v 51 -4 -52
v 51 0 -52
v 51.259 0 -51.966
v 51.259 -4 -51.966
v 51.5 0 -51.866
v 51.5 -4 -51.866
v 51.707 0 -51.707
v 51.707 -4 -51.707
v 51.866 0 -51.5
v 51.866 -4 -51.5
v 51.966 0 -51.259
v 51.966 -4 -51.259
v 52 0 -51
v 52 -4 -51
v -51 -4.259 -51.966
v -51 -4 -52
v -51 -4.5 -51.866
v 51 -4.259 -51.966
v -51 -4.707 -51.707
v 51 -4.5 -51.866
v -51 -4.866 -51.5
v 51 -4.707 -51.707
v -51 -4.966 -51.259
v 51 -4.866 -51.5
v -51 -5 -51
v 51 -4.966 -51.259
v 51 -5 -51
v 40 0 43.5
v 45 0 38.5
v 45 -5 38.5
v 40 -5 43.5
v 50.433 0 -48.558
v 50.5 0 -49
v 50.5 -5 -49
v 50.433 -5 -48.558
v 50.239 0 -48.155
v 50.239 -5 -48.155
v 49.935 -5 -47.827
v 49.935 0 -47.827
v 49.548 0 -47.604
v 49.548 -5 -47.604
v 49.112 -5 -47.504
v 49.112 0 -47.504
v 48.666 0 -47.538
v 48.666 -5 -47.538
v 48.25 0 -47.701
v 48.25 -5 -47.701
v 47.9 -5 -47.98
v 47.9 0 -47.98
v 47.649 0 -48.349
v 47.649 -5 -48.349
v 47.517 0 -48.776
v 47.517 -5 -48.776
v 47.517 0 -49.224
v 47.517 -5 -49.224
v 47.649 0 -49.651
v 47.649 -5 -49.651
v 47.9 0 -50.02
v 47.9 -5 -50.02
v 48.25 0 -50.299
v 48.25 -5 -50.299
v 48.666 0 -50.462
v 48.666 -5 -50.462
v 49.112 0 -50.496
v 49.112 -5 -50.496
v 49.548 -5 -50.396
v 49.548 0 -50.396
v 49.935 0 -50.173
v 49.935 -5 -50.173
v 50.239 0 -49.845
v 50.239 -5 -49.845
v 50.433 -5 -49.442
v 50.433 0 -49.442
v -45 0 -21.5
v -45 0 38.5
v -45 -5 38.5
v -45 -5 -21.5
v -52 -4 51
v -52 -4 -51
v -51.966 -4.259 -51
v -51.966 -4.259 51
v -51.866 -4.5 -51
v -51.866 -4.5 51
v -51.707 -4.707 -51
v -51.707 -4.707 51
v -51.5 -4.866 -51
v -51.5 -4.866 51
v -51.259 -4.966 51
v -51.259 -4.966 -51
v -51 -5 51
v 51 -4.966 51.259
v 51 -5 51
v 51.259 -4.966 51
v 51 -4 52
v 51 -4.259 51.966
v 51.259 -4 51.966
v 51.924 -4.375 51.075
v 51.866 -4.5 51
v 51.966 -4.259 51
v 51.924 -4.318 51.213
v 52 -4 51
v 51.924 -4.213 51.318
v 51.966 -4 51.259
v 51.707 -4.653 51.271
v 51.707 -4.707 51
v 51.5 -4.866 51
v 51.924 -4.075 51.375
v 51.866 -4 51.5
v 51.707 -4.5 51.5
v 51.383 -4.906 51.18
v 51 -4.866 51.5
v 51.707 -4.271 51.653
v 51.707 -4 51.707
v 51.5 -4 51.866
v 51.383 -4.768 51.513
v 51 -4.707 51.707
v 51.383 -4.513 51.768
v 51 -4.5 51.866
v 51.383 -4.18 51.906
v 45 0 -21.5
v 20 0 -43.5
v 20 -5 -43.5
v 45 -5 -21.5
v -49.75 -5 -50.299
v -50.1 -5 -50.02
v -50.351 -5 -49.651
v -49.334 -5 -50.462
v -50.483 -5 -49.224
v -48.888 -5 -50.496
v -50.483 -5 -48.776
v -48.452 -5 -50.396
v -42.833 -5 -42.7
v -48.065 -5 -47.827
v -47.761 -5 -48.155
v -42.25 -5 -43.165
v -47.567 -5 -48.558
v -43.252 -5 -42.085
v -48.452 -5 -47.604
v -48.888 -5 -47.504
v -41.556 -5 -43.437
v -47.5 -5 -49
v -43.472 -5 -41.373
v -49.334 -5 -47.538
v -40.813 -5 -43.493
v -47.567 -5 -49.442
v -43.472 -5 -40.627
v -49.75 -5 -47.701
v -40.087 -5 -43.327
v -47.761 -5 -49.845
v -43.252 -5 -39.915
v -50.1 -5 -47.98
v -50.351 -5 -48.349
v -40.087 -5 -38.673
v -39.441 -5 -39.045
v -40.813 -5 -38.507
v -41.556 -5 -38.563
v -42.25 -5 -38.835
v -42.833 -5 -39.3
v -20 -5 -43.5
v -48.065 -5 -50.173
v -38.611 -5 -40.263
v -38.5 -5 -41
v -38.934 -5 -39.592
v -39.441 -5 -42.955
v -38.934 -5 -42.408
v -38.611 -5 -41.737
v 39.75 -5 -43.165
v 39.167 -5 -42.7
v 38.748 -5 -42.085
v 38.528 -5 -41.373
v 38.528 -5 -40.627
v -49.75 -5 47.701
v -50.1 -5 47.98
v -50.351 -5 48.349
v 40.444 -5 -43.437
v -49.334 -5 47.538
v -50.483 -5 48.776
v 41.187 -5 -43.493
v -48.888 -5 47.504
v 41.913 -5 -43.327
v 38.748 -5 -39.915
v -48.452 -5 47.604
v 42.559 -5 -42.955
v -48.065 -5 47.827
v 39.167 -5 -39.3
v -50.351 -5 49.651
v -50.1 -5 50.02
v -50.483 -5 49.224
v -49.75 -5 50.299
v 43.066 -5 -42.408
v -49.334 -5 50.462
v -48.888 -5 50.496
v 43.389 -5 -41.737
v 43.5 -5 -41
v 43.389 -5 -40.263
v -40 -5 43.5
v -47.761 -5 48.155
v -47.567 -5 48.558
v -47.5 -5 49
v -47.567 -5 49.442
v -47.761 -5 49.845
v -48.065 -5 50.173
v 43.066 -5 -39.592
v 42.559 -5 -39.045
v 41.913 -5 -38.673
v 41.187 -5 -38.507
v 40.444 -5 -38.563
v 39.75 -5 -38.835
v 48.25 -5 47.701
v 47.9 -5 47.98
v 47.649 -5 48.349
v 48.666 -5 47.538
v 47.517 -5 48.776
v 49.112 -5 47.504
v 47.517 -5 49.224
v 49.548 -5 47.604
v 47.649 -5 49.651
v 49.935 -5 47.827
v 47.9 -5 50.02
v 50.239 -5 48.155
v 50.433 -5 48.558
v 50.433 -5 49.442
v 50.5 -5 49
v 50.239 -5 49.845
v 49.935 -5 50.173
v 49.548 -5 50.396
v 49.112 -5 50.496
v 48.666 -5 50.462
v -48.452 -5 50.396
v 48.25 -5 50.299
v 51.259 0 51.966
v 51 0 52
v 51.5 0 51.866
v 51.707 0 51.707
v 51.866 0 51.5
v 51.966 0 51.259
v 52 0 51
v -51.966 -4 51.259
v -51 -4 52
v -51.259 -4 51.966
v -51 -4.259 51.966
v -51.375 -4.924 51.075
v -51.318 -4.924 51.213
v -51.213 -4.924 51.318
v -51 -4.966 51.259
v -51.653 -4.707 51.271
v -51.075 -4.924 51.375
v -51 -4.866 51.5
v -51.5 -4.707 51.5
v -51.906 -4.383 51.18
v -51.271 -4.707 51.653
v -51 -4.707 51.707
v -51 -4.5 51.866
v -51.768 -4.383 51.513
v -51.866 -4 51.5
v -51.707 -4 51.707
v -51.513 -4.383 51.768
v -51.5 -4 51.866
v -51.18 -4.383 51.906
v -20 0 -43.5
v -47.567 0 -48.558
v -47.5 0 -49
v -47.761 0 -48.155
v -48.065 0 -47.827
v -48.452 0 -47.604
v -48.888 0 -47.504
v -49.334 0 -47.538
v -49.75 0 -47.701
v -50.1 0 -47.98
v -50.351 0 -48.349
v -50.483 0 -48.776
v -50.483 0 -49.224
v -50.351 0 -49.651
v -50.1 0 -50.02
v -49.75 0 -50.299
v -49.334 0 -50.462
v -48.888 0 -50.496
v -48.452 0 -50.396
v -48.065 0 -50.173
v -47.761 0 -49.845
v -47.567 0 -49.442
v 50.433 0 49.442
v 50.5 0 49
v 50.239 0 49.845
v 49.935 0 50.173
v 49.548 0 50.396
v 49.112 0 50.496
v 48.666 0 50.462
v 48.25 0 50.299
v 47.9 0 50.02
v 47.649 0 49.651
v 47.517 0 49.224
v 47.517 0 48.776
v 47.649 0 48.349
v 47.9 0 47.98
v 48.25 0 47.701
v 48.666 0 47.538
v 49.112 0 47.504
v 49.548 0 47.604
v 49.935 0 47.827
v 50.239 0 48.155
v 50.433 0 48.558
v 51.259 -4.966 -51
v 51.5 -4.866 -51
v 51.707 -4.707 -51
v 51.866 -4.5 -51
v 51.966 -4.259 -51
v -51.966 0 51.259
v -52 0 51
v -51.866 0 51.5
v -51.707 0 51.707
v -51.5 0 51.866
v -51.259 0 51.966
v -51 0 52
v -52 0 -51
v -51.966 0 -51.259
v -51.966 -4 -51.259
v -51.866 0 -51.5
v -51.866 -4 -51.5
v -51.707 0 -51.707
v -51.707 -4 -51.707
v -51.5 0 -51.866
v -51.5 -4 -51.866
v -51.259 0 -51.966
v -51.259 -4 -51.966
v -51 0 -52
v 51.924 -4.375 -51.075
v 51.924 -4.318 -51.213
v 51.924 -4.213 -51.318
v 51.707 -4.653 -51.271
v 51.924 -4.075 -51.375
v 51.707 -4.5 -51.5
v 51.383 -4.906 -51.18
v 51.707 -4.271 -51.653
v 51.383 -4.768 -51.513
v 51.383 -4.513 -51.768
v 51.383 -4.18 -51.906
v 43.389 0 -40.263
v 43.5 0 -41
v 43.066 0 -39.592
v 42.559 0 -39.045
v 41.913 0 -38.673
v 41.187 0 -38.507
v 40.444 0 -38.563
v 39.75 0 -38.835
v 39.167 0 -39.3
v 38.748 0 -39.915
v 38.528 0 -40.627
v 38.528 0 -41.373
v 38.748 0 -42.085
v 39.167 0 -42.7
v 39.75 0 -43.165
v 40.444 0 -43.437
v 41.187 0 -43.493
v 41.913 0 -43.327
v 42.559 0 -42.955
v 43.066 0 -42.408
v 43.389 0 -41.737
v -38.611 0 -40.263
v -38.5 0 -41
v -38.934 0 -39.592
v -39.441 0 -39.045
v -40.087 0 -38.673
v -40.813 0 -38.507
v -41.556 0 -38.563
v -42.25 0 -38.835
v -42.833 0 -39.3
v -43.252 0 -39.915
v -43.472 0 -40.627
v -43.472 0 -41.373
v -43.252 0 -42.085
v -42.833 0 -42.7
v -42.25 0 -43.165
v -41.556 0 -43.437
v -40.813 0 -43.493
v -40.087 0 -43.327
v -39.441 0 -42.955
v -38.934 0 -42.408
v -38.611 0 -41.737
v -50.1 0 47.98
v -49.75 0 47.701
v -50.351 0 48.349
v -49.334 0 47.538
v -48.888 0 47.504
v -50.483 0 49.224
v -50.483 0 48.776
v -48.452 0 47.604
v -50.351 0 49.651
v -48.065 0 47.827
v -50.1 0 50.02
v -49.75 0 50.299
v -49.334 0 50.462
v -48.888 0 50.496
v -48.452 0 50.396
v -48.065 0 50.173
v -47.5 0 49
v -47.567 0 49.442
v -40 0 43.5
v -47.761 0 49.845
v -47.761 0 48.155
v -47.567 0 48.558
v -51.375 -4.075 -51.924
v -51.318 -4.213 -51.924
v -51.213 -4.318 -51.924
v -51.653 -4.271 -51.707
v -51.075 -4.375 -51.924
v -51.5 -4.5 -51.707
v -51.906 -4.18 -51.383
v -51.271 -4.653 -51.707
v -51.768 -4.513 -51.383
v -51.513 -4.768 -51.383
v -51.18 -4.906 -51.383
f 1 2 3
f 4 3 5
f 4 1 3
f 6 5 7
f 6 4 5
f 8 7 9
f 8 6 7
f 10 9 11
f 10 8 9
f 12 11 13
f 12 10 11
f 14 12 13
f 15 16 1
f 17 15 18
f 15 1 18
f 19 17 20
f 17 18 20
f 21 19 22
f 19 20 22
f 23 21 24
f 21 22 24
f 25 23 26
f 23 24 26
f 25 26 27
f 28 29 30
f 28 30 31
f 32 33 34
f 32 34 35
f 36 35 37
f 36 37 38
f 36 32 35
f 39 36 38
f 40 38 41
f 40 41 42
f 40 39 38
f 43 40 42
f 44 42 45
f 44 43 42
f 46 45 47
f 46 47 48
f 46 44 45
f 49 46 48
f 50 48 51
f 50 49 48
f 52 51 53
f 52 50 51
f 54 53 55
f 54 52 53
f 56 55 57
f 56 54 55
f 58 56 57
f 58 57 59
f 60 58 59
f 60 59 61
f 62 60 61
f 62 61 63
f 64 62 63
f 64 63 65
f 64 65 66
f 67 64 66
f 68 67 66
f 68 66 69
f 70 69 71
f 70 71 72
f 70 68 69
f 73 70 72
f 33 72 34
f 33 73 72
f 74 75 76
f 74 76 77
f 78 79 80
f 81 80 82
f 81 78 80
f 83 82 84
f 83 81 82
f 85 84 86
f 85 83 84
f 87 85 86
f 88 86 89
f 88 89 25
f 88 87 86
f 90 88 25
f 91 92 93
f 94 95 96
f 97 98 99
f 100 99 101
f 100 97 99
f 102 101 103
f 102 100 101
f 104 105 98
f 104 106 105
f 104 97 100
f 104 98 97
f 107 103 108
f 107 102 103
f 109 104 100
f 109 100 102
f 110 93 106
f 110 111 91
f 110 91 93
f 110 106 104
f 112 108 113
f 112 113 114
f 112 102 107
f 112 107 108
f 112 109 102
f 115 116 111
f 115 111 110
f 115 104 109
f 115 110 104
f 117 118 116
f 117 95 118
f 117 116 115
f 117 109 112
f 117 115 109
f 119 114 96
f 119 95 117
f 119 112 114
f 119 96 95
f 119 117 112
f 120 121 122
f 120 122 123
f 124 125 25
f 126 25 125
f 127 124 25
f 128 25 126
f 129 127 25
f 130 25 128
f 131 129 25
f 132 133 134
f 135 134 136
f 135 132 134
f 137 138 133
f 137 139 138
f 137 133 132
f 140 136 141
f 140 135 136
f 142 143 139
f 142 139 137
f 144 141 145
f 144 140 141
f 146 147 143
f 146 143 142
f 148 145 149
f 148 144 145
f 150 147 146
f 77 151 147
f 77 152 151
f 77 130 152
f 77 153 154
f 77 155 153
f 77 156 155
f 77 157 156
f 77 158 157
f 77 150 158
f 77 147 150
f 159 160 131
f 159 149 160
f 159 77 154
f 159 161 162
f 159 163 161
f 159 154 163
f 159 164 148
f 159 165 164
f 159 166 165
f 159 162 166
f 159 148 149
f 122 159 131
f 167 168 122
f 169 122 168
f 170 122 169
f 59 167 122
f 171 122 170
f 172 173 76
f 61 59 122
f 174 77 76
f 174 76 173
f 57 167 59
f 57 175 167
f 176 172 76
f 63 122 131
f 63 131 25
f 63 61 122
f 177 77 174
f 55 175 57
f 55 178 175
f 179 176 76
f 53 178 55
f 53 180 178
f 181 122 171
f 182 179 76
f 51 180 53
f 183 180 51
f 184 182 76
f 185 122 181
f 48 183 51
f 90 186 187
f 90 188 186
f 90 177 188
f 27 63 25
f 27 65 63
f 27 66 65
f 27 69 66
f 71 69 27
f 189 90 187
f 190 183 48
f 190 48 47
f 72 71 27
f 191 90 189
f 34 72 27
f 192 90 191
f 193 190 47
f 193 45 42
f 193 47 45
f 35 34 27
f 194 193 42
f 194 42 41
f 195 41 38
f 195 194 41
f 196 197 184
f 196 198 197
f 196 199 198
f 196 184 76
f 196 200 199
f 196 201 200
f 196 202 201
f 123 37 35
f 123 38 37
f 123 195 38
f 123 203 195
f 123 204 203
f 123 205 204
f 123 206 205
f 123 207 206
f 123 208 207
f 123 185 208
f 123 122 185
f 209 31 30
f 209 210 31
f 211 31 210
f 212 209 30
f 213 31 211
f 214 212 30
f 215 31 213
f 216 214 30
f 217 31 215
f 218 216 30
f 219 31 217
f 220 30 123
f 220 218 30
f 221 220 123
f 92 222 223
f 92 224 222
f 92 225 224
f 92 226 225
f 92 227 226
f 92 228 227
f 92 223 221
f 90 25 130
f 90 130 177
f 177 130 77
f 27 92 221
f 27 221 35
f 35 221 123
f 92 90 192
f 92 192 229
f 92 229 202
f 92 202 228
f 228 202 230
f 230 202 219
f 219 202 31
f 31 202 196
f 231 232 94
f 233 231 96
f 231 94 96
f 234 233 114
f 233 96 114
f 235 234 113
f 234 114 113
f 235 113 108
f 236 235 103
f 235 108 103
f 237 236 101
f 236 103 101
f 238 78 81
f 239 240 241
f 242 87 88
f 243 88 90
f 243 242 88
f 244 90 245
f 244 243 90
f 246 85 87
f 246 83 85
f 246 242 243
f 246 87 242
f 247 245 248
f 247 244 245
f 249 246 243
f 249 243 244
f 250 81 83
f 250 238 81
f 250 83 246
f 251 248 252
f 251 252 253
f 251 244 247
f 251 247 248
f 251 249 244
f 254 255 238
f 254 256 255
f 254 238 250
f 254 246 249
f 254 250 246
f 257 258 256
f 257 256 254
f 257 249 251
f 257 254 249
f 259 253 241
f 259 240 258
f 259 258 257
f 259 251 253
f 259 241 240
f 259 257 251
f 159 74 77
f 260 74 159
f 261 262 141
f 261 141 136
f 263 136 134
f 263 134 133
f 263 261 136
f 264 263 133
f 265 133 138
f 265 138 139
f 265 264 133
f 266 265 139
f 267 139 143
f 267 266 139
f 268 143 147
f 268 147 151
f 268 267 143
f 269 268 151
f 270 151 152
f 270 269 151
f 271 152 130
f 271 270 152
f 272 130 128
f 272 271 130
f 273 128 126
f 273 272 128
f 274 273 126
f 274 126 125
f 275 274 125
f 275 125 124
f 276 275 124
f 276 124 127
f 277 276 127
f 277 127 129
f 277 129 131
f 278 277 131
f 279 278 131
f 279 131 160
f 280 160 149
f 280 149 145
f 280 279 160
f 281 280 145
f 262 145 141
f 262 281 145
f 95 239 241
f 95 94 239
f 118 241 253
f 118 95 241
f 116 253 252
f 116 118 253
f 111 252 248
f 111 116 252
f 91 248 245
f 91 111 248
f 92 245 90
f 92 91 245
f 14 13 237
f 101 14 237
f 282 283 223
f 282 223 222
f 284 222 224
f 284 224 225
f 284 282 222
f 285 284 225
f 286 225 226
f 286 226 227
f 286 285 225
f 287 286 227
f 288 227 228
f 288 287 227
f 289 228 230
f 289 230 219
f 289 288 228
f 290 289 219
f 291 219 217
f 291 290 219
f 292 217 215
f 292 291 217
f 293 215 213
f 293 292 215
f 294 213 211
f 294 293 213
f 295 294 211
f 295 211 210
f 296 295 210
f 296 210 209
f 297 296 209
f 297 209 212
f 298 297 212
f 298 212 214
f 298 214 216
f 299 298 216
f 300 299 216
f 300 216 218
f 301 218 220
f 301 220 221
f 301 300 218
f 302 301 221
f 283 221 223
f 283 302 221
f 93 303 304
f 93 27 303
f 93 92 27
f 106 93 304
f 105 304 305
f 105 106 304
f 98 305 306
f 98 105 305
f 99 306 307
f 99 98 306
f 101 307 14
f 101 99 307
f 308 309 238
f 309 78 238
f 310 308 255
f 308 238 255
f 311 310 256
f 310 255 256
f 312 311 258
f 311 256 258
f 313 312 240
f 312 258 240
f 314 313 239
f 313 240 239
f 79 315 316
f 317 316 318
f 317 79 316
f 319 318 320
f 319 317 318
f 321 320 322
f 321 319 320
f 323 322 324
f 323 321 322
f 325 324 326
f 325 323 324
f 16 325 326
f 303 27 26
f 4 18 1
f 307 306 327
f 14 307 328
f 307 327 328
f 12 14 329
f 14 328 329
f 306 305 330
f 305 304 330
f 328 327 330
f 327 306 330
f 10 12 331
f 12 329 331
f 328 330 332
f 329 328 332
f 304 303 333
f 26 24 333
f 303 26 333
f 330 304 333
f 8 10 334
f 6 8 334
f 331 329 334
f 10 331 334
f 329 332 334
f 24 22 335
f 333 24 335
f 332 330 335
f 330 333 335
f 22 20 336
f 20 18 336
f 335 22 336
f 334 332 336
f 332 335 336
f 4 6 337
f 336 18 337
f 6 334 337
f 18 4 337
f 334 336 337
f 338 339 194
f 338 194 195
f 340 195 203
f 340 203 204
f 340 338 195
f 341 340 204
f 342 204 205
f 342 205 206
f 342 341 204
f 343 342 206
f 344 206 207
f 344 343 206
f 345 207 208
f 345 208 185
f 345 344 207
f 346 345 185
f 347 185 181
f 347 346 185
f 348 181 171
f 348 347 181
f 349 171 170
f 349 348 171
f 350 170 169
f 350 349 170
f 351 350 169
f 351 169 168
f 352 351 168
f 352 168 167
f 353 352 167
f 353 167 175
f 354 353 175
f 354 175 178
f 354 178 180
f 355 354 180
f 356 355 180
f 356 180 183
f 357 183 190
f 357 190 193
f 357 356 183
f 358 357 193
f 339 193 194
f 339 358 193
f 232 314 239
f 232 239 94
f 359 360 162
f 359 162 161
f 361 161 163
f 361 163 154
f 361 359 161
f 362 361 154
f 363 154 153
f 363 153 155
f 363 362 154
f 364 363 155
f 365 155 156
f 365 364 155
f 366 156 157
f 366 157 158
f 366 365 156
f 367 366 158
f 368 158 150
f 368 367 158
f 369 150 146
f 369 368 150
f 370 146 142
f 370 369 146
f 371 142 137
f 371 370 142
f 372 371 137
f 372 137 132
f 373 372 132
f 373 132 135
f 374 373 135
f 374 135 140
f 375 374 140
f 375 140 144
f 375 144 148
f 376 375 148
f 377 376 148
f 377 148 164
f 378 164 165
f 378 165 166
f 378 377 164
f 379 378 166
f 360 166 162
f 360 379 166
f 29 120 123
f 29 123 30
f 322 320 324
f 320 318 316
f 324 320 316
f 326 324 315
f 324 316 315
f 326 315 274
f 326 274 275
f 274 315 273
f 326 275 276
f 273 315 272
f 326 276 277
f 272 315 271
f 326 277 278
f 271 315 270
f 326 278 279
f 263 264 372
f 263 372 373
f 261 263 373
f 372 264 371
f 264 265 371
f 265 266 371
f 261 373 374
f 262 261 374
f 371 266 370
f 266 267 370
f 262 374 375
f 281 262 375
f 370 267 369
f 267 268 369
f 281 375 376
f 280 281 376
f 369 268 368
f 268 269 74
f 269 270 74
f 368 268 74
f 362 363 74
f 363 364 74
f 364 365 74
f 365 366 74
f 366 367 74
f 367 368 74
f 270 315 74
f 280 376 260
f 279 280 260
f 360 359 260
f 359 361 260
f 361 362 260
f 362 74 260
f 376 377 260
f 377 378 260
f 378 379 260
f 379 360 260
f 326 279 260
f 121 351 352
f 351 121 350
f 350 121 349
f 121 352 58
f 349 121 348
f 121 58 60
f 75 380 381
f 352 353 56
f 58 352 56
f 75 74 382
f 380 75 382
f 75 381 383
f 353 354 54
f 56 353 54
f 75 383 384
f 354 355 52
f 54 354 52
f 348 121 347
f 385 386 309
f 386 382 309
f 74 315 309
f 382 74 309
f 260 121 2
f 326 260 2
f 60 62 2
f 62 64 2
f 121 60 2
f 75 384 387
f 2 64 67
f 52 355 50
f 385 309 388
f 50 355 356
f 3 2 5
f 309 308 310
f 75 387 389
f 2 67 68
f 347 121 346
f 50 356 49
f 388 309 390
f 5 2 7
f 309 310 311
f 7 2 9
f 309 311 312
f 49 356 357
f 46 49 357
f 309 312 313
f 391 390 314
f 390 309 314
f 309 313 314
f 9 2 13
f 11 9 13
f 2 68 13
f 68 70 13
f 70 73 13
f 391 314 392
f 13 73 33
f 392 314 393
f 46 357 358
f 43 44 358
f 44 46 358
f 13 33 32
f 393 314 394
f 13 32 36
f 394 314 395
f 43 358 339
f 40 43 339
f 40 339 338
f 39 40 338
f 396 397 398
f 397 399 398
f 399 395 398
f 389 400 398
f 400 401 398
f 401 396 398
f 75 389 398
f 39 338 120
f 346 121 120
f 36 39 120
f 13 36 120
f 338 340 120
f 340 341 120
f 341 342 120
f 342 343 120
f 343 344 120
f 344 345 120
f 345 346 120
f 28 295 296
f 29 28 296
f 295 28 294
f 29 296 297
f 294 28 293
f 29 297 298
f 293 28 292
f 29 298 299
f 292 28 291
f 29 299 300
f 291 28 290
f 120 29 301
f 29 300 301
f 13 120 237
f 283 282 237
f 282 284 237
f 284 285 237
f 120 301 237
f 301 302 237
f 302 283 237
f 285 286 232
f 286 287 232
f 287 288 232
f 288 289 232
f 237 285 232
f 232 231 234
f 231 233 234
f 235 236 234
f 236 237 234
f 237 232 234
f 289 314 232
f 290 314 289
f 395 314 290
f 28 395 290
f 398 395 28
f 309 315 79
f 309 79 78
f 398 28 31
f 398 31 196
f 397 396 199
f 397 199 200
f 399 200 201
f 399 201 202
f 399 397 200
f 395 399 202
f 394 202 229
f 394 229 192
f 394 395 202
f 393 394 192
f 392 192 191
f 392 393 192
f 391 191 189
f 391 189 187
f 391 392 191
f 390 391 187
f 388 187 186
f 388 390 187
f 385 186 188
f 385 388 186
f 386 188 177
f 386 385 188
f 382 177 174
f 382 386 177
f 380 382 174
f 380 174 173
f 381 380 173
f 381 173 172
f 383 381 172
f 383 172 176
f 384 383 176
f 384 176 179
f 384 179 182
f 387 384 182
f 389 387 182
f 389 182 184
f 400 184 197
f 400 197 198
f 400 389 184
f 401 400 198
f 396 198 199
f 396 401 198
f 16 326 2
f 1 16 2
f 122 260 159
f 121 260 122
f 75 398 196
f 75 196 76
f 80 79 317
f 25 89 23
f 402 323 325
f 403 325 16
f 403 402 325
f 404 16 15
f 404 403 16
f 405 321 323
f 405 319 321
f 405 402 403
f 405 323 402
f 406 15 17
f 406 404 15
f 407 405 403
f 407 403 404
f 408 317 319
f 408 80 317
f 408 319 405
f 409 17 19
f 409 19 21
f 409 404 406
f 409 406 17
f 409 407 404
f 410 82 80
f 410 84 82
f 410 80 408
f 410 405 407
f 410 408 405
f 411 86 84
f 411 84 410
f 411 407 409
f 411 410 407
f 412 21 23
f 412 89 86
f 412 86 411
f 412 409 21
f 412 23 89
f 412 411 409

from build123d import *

# Parameters (mm, degrees)
F0_W        = 104
F0_H        = 104
F0_R        = 1.5
F0_R_2      = 2.5
F2_DEPTH    = 5
F2_FACE_W   = 104
F2_FACE_H   = 104
F2_FACE_R   = 1.5
F2_FACE_R_2 = 2.5
F3_DEPTH    = 25
F4_R        = 1


with BuildPart() as f2:
    # F0 (on Front) → F2 (new body)
    with BuildSketch(Plane.XZ):
        Rectangle(F0_W, F0_H)
        with Locations((-49, -49)):
            Circle(F0_R, mode=Mode.SUBTRACT)
        with Locations((-41, -41)):
            Circle(F0_R_2, mode=Mode.SUBTRACT)
        with Locations((49, -49)):
            Circle(F0_R, mode=Mode.SUBTRACT)
        with Locations((41, -41)):
            Circle(F0_R_2, mode=Mode.SUBTRACT)
        with Locations((-49, 49)):
            Circle(F0_R, mode=Mode.SUBTRACT)
        with Locations((49, 49)):
            Circle(F0_R, mode=Mode.SUBTRACT)
    extrude(amount=F2_DEPTH)

    # F1 (on Front) + F2_face (on face) → F3 (cut)
    with BuildSketch(Plane.XZ):
        Polygon((40, 43.5), (-40, 43.5), (-45, 38.5), (-45, -21.5), (-20, -43.5), (20, -43.5), (45, -21.5), (45, 38.5), align=None)
    with BuildSketch(Plane(origin=(0, -5, 0.149795), x_dir=(1, 0, 0), z_dir=(0, -1, 0))):
        with Locations((0, -0.149795)):
            Rectangle(F2_FACE_W, F2_FACE_H)
        with Locations((-49, -49.149795)):
            Circle(F2_FACE_R, mode=Mode.SUBTRACT)
        with Locations((-41, -41.149795)):
            Circle(F2_FACE_R_2, mode=Mode.SUBTRACT)
        with Locations((49, -49.149795)):
            Circle(F2_FACE_R, mode=Mode.SUBTRACT)
        with Locations((41, -41.149795)):
            Circle(F2_FACE_R_2, mode=Mode.SUBTRACT)
        with Locations((-49, 48.850205)):
            Circle(F2_FACE_R, mode=Mode.SUBTRACT)
        with Locations((49, 48.850205)):
            Circle(F2_FACE_R, mode=Mode.SUBTRACT)
    extrude(amount=F3_DEPTH, mode=Mode.SUBTRACT)

    # F4
    f4_edges = [f2.edges().sort_by_distance(p)[0] for p in [
        (-52, -2.5, 52),
        (-52, -5, 0),
        (0, -5, 52),
        (-52, -2.5, -52),
        (0, -5, -52),
        (52, -5, 0),
        (52, -2.5, 52),
        (52, -2.5, -52),
    ]]
    fillet(f4_edges, radius=F4_R)


solid = f2.part
